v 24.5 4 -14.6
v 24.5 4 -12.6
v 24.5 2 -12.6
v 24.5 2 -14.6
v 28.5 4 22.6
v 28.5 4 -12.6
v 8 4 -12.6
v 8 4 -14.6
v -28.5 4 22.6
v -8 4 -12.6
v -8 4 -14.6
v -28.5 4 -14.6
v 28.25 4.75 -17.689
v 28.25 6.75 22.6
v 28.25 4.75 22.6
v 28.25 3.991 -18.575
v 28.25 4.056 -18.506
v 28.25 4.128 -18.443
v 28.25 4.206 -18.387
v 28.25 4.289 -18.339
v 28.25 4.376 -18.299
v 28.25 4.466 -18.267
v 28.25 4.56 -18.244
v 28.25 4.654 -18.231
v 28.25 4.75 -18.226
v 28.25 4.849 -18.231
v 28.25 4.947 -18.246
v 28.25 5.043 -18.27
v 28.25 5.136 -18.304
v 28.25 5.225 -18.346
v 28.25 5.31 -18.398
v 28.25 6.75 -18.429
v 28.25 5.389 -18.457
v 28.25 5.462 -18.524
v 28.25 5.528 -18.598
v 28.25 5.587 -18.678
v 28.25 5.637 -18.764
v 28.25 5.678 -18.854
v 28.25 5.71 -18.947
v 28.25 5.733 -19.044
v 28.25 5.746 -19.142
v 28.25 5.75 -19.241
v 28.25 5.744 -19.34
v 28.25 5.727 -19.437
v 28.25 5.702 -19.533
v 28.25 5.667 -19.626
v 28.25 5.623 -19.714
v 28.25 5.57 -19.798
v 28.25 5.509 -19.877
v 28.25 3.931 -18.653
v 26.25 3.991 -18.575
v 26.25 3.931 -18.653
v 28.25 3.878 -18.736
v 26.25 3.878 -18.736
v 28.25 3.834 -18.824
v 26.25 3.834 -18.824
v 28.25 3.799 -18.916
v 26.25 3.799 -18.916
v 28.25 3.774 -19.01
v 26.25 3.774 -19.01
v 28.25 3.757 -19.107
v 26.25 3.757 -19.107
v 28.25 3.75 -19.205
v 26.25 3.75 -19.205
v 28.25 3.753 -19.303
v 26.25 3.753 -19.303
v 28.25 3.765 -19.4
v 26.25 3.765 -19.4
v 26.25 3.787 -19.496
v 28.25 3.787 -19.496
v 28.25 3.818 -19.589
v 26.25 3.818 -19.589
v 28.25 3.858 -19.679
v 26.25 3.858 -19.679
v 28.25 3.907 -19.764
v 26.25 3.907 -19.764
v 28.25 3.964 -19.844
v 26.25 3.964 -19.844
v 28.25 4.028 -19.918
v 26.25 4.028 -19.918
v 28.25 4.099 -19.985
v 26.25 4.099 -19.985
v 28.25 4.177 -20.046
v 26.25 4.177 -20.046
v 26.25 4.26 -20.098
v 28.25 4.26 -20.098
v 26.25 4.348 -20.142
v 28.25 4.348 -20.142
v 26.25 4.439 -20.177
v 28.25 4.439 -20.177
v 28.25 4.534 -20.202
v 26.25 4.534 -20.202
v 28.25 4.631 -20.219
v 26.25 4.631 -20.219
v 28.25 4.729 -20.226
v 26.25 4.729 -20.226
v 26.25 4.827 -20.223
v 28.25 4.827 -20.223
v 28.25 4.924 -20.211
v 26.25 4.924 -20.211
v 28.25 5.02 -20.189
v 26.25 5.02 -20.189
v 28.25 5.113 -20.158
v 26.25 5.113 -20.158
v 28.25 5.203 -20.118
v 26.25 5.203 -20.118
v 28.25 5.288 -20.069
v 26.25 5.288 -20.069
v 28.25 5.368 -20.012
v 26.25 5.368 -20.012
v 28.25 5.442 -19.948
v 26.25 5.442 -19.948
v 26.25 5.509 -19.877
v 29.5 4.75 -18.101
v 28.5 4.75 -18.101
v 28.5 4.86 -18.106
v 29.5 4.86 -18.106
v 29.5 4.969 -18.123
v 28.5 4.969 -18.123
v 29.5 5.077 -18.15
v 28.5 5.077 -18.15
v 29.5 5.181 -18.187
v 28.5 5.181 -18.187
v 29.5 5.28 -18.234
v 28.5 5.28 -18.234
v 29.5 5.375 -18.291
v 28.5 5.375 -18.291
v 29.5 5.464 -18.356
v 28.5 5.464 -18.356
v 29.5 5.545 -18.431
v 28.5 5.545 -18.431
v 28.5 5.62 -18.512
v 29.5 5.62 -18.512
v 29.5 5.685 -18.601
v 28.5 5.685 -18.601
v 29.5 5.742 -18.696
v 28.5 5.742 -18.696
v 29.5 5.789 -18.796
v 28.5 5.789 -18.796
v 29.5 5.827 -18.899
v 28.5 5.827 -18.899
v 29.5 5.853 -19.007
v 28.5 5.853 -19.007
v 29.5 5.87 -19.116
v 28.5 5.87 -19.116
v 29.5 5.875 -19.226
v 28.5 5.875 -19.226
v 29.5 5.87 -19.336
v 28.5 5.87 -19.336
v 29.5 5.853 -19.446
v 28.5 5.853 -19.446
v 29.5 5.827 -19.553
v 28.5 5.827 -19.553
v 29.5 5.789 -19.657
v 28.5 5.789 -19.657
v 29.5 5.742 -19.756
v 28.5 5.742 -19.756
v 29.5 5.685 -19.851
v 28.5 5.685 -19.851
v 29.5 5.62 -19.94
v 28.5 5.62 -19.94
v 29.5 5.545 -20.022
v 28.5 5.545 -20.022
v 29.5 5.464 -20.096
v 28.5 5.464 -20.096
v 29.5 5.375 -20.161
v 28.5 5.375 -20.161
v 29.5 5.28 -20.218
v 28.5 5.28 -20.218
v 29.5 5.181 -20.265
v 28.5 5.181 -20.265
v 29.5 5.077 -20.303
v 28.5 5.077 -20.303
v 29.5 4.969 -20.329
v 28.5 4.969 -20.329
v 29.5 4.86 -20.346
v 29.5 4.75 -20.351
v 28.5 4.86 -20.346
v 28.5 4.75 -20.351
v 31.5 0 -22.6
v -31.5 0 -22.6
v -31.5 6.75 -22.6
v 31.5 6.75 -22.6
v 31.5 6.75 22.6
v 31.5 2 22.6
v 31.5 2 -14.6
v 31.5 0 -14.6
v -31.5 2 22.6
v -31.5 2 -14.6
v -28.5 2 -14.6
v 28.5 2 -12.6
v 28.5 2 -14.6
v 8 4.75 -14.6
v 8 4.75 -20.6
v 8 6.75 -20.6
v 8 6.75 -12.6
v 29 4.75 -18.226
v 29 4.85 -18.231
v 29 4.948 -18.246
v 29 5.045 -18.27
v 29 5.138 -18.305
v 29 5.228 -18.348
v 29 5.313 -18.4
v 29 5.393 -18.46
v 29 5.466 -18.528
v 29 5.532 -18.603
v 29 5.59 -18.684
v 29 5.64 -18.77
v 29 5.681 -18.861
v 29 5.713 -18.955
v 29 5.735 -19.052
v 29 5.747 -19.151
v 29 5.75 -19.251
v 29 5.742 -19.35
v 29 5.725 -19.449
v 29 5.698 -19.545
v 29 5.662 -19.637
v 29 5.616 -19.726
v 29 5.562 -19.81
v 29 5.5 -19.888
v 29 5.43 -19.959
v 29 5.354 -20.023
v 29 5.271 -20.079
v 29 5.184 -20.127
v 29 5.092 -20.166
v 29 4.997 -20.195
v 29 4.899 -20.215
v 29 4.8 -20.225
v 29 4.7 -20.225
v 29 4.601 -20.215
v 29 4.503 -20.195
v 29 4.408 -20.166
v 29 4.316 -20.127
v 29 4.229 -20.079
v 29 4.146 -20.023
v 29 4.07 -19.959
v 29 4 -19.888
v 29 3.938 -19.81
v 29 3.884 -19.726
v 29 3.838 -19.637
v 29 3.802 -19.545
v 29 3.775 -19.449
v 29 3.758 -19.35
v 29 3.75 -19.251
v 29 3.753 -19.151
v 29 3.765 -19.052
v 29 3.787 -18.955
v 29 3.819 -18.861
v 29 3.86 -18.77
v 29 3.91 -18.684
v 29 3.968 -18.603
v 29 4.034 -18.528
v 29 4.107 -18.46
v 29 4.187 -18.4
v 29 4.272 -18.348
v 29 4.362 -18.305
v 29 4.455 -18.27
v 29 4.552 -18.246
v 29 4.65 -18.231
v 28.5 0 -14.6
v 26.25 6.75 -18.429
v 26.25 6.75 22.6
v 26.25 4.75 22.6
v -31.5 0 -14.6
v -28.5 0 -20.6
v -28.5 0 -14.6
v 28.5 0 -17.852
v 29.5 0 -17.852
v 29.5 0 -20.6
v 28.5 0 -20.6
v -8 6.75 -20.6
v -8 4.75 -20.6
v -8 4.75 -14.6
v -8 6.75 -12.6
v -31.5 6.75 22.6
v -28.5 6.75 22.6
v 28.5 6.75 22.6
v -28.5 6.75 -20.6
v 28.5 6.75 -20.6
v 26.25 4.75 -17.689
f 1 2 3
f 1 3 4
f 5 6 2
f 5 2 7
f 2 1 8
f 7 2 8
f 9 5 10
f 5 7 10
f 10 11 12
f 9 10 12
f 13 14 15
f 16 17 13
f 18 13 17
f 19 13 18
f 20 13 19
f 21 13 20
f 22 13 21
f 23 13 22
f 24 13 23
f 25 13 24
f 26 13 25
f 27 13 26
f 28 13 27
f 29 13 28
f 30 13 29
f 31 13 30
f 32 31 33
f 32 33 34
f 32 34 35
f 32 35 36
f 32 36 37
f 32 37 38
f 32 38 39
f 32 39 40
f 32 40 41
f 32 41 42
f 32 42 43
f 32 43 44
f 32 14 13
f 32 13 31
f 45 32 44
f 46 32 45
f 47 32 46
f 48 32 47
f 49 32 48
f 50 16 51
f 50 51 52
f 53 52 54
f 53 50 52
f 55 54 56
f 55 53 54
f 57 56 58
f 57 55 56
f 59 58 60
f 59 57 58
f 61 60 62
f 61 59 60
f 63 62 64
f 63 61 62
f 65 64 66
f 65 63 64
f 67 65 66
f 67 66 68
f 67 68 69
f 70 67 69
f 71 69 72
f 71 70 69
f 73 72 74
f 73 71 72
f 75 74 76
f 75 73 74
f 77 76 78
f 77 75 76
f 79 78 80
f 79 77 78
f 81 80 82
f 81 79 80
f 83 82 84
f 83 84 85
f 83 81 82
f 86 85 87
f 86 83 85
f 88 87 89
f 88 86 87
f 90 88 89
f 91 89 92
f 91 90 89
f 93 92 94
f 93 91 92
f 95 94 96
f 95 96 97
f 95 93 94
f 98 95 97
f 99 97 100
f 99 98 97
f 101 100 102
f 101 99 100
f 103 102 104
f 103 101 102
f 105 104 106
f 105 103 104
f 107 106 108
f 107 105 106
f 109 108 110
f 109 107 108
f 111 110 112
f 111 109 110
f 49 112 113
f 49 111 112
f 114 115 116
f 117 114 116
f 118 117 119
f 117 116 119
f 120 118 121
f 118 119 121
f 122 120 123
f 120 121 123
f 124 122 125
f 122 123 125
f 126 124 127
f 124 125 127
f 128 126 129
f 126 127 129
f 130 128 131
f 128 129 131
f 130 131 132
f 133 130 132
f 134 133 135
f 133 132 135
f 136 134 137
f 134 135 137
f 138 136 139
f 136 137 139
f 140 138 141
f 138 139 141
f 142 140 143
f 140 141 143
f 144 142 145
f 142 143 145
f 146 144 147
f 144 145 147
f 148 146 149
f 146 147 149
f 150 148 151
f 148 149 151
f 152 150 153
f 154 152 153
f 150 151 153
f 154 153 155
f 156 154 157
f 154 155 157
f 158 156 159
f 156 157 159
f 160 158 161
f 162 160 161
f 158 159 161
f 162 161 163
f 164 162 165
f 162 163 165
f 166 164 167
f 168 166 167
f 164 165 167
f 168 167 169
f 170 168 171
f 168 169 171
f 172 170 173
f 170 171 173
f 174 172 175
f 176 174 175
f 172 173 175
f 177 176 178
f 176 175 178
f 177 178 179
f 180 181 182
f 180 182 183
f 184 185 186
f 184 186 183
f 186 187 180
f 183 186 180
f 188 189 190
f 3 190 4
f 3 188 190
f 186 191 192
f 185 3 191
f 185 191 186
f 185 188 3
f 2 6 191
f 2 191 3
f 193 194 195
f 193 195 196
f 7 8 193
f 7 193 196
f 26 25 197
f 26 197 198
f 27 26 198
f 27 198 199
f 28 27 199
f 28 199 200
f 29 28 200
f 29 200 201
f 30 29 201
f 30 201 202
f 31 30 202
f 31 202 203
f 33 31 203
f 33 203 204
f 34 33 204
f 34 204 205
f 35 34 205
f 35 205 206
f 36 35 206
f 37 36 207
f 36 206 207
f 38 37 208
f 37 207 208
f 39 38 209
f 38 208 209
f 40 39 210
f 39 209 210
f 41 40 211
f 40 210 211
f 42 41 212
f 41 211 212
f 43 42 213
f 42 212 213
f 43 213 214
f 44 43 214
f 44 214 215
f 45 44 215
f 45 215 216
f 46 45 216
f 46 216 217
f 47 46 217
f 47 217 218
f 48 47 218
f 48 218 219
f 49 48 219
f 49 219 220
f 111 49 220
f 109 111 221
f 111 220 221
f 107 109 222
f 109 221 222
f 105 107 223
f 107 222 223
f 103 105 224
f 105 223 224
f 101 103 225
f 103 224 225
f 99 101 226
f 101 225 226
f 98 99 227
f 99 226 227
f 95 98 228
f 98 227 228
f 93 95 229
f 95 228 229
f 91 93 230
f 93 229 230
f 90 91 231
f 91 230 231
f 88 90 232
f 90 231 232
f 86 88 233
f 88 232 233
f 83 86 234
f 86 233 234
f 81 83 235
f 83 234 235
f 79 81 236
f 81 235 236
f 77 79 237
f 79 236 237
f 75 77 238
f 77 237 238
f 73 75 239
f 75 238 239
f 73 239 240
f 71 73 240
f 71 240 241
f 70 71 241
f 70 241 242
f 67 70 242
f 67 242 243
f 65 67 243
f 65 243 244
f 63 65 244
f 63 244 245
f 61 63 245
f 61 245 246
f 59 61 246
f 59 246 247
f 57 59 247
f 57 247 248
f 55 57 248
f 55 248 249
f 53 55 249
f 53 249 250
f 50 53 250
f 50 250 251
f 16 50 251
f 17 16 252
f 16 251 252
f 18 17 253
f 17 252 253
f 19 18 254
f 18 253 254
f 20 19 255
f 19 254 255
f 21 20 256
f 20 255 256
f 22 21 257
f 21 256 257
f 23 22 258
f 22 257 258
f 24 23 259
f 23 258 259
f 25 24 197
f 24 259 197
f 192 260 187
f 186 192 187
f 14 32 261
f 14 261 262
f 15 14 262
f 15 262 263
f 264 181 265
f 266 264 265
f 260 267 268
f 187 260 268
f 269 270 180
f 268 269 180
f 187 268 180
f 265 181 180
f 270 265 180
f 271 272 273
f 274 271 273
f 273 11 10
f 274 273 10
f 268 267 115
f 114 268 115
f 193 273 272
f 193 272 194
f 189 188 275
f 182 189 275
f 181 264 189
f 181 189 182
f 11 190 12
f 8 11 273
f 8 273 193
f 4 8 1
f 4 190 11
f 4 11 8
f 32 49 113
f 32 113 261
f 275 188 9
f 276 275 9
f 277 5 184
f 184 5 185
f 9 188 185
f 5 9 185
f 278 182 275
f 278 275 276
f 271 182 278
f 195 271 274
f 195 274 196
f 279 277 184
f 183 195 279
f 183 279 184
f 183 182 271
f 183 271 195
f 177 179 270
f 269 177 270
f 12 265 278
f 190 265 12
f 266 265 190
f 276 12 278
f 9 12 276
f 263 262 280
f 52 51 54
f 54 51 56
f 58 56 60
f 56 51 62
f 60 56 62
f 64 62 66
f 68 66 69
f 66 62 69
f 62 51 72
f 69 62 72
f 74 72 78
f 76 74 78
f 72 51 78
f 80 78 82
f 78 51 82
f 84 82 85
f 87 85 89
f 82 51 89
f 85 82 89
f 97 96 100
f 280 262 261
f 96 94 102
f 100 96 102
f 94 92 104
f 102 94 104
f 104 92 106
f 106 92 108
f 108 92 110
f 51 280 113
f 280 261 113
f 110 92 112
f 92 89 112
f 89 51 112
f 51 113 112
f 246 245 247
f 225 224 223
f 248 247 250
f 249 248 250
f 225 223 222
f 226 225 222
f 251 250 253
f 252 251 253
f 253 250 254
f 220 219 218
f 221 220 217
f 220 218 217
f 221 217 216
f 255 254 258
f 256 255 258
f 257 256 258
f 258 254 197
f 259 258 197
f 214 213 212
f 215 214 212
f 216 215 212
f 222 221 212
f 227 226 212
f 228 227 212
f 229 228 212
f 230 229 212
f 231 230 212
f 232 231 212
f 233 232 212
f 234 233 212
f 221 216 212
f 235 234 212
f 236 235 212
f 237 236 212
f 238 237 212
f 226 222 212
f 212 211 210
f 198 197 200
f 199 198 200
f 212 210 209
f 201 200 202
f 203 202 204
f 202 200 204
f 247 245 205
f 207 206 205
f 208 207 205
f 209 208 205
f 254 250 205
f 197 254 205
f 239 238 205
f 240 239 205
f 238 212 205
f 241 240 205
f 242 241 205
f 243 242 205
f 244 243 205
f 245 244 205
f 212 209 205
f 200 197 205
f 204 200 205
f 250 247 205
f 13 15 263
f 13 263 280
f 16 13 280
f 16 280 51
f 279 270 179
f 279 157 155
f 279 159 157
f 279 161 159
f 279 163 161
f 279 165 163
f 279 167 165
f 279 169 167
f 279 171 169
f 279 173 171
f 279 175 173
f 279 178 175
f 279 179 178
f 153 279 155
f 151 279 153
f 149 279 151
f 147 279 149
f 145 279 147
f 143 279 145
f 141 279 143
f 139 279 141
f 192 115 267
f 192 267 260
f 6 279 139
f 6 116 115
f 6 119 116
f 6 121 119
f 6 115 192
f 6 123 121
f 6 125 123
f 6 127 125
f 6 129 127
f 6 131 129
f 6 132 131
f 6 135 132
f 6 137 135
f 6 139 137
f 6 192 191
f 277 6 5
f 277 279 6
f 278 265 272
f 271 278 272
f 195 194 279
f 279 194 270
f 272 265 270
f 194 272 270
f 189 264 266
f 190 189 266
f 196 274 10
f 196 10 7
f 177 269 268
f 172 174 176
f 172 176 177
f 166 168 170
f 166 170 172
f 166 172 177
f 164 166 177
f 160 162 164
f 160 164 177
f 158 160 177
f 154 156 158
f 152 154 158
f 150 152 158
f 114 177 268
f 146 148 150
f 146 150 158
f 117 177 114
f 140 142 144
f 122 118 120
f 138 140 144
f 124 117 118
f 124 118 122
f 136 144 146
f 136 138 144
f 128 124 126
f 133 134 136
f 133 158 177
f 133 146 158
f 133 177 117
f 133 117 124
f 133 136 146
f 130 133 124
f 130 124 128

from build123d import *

# Parameters (mm, degrees)
SKETCH1_W           = 63
SKETCH1_H           = 45.2
BOSS_EXTRUDE1_DEPTH = 6.75
SKETCH2_W           = 63
SKETCH2_H           = 37.2
CUT_EXTRUDE1_DEPTH  = 2
CUT_EXTRUDE2_DEPTH  = 2.75
SKETCH4_W           = 20.5
SKETCH4_H           = 6
CUT_EXTRUDE3_DEPTH  = 40.351905926
SKETCH5_W           = 16
SKETCH5_H           = 6
CUT_EXTRUDE4_DEPTH  = 4.75
CUT_EXTRUDE5_DEPTH  = 1
BOSS_EXTRUDE2_START = 0.5
SKETCH7_R           = 1
BOSS_EXTRUDE2_DEPTH = 0.75
BOSS_EXTRUDE3_DEPTH = 2
CUT_EXTRUDE6_DEPTH  = 39.974478829


with BuildPart() as part:
    # Sketch1 → Boss-Extrude1 (new body)
    with BuildSketch(Plane(origin=(0, 0, 0), x_dir=(1, 0, 0), z_dir=(0, 1, 0))):
        Rectangle(SKETCH1_W, SKETCH1_H)
    extrude(amount=BOSS_EXTRUDE1_DEPTH)

    # Sketch2 → Cut-Extrude1 (cut)
    with BuildSketch(Plane.XZ):
        with Locations((0, 4)):
            Rectangle(SKETCH2_W, SKETCH2_H)
    extrude(amount=-CUT_EXTRUDE1_DEPTH, mode=Mode.SUBTRACT)

    # Sketch3 → Cut-Extrude2 (cut)
    with BuildSketch(Plane(origin=(0, 6.75, 0), x_dir=(1, 0, 0), z_dir=(0, 1, 0))):
        Polygon((-28.5, 20.6), (-8, 20.6), (-8, 12.6), (8, 12.6), (8, 20.6), (28.5, 20.6), (28.5, -22.6), (-28.5, -22.6), align=None)
    extrude(amount=-CUT_EXTRUDE2_DEPTH, mode=Mode.SUBTRACT)

    # Sketch4 → Cut-Extrude3 (cut, through all)
    with BuildSketch(Plane.XZ):
        with Locations((-18.25, -17.6)):
            Rectangle(SKETCH4_W, SKETCH4_H)
        with Locations((18.25, -17.6)):
            Rectangle(SKETCH4_W, SKETCH4_H)
    extrude(amount=-CUT_EXTRUDE3_DEPTH, mode=Mode.SUBTRACT)

    # Sketch5 → Cut-Extrude4 (cut)
    with BuildSketch(Plane.XZ):
        with Locations((0, -17.6)):
            Rectangle(SKETCH5_W, SKETCH5_H)
    extrude(amount=-CUT_EXTRUDE4_DEPTH, mode=Mode.SUBTRACT)

    # Sketch6 → Cut-Extrude5 (cut)
    with BuildSketch(Plane.ZY.offset(-28.5)):
        with BuildLine():
            Line((-20.351063048, 4.75), (-20.6, 0))
            Line((-20.6, 0), (-17.852126097, 0))
            Line((-17.852126097, 0), (-18.101063048, 4.75))
            ThreePointArc((-18.101063048, 4.75), (-19.226063048, 5.875), (-20.351063048, 4.75))
        make_face()
    extrude(amount=-CUT_EXTRUDE5_DEPTH, mode=Mode.SUBTRACT)

    # Sketch9 → Cut-Extrude6 (cut, through all)
    with BuildSketch(Plane(origin=(0, 4, 0), x_dir=(1, 0, 0), z_dir=(0, 1, 0))):
        Polygon((8, 20.6), (28.5, 20.6), (28.5, 12.6), (24.5, 12.6), (24.5, 14.6), (8, 14.6), align=None)
    extrude(amount=-CUT_EXTRUDE6_DEPTH, mode=Mode.SUBTRACT)


with BuildPart() as body_2:
    # Sketch7 → Boss-Extrude2 (new body)
    with BuildSketch(Plane.ZY.offset(-29.5).offset(BOSS_EXTRUDE2_START)):
        with Locations((-19.226063048, 4.75)):
            Circle(SKETCH7_R)
    extrude(amount=BOSS_EXTRUDE2_DEPTH)

    # Sketch8 → Boss-Extrude3 (add)
    with BuildSketch(Plane.ZY.offset(-28.25)):
        with BuildLine():
            Line((-19.876707821, 5.509382235), (-18.428754759, 6.75))
            Line((-18.428754759, 6.75), (22.6, 6.75))
            Line((22.6, 6.75), (22.6, 4.75))
            Line((22.6, 4.75), (-17.689126087, 4.75))
            Line((-17.689126087, 4.75), (-18.575418276, 3.990617765))
            ThreePointArc((-18.575418276, 3.990617765), (-19.985445284, 4.099355227), (-19.876707821, 5.509382235))
        make_face()
    extrude(amount=BOSS_EXTRUDE3_DEPTH)


solid = Compound([part.part, body_2.part])
